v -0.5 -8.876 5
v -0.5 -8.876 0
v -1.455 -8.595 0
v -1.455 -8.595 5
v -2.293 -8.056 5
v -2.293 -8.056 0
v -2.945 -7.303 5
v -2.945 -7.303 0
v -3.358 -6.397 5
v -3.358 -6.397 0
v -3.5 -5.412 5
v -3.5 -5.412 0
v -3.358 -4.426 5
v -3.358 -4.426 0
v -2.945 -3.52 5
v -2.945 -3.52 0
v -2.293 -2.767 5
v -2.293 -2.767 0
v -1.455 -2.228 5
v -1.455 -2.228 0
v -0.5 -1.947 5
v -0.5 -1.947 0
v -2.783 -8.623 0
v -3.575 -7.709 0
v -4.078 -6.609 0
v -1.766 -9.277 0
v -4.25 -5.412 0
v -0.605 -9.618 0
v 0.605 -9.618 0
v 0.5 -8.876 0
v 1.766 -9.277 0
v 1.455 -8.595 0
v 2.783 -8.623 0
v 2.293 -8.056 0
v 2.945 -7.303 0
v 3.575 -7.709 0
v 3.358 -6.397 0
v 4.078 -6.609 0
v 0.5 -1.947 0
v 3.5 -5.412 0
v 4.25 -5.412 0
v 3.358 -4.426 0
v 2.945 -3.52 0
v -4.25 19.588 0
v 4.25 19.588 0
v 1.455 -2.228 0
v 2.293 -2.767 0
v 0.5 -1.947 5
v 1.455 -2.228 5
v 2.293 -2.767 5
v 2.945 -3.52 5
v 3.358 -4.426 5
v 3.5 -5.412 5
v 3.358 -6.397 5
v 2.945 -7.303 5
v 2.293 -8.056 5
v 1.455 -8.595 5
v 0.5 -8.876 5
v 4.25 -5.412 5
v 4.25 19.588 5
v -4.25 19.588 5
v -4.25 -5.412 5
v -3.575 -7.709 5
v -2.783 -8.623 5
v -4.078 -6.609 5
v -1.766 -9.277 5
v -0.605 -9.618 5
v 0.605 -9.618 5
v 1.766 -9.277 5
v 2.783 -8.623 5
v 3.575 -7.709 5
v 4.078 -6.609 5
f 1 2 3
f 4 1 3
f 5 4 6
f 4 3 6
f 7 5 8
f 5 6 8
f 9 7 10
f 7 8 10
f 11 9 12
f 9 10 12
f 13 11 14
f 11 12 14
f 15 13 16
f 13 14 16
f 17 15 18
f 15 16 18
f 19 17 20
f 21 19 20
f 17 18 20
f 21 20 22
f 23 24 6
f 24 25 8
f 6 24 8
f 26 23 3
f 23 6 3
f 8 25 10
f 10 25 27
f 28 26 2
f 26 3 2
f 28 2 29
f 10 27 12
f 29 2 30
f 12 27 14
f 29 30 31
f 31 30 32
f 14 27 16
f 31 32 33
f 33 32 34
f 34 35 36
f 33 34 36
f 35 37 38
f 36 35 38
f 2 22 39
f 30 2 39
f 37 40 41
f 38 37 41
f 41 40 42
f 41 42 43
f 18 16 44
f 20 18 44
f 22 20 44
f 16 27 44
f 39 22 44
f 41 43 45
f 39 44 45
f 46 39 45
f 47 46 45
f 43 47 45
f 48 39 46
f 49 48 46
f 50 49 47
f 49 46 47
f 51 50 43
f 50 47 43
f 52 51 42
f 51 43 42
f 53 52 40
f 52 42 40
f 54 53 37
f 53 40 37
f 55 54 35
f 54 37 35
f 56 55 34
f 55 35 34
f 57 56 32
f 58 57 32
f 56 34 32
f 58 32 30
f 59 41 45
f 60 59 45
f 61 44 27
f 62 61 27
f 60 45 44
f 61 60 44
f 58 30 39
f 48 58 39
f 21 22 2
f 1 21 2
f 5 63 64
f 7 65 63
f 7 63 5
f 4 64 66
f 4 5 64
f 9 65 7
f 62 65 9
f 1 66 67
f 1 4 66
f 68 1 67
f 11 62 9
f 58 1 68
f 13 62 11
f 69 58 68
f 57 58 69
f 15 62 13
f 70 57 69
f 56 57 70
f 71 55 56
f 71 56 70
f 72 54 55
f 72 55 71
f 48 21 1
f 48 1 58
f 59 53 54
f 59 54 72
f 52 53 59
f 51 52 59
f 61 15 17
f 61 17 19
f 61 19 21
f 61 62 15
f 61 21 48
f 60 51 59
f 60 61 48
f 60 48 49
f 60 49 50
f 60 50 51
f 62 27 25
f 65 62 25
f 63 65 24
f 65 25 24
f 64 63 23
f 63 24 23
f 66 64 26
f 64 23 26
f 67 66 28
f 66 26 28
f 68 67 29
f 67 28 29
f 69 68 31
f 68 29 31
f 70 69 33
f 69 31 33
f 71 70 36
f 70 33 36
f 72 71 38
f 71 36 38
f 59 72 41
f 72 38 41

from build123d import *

# Parameters (mm, degrees)
F1_DEPTH = 5


with BuildPart() as f1:
    # F0 (on Top) → F1 (new body)
    with BuildSketch(Plane.XY):
        with BuildLine():
            Line((-4.25, 19.588463), (-4.25, -5.411537))
            ThreePointArc((-4.25, -5.411537), (0, -9.661537), (4.25, -5.411537))
            Line((4.25, -5.411537), (4.25, 19.588463))
            Line((4.25, 19.588463), (-4.25, 19.588463))
        make_face()
        with BuildLine():
            Line((-0.5, -1.947436), (-0.5, -2.962048))
            Line((-0.5, -2.962048), (-0.5, -7.861027))
            Line((-0.5, -7.861027), (-0.5, -8.875639))
            ThreePointArc((-0.5, -8.875639), (-3.5, -5.411537), (-0.5, -1.947436))
        make_face(mode=Mode.SUBTRACT)
        with BuildLine():
            Line((0.5, -7.861027), (0.5, -2.962048))
            Line((0.5, -2.962048), (0.5, -1.947436))
            ThreePointArc((0.5, -1.947436), (3.5, -5.411537), (0.5, -8.875639))
            Line((0.5, -8.875639), (0.5, -7.861027))
        make_face(mode=Mode.SUBTRACT)
    extrude(amount=F1_DEPTH)


solid = f1.part
